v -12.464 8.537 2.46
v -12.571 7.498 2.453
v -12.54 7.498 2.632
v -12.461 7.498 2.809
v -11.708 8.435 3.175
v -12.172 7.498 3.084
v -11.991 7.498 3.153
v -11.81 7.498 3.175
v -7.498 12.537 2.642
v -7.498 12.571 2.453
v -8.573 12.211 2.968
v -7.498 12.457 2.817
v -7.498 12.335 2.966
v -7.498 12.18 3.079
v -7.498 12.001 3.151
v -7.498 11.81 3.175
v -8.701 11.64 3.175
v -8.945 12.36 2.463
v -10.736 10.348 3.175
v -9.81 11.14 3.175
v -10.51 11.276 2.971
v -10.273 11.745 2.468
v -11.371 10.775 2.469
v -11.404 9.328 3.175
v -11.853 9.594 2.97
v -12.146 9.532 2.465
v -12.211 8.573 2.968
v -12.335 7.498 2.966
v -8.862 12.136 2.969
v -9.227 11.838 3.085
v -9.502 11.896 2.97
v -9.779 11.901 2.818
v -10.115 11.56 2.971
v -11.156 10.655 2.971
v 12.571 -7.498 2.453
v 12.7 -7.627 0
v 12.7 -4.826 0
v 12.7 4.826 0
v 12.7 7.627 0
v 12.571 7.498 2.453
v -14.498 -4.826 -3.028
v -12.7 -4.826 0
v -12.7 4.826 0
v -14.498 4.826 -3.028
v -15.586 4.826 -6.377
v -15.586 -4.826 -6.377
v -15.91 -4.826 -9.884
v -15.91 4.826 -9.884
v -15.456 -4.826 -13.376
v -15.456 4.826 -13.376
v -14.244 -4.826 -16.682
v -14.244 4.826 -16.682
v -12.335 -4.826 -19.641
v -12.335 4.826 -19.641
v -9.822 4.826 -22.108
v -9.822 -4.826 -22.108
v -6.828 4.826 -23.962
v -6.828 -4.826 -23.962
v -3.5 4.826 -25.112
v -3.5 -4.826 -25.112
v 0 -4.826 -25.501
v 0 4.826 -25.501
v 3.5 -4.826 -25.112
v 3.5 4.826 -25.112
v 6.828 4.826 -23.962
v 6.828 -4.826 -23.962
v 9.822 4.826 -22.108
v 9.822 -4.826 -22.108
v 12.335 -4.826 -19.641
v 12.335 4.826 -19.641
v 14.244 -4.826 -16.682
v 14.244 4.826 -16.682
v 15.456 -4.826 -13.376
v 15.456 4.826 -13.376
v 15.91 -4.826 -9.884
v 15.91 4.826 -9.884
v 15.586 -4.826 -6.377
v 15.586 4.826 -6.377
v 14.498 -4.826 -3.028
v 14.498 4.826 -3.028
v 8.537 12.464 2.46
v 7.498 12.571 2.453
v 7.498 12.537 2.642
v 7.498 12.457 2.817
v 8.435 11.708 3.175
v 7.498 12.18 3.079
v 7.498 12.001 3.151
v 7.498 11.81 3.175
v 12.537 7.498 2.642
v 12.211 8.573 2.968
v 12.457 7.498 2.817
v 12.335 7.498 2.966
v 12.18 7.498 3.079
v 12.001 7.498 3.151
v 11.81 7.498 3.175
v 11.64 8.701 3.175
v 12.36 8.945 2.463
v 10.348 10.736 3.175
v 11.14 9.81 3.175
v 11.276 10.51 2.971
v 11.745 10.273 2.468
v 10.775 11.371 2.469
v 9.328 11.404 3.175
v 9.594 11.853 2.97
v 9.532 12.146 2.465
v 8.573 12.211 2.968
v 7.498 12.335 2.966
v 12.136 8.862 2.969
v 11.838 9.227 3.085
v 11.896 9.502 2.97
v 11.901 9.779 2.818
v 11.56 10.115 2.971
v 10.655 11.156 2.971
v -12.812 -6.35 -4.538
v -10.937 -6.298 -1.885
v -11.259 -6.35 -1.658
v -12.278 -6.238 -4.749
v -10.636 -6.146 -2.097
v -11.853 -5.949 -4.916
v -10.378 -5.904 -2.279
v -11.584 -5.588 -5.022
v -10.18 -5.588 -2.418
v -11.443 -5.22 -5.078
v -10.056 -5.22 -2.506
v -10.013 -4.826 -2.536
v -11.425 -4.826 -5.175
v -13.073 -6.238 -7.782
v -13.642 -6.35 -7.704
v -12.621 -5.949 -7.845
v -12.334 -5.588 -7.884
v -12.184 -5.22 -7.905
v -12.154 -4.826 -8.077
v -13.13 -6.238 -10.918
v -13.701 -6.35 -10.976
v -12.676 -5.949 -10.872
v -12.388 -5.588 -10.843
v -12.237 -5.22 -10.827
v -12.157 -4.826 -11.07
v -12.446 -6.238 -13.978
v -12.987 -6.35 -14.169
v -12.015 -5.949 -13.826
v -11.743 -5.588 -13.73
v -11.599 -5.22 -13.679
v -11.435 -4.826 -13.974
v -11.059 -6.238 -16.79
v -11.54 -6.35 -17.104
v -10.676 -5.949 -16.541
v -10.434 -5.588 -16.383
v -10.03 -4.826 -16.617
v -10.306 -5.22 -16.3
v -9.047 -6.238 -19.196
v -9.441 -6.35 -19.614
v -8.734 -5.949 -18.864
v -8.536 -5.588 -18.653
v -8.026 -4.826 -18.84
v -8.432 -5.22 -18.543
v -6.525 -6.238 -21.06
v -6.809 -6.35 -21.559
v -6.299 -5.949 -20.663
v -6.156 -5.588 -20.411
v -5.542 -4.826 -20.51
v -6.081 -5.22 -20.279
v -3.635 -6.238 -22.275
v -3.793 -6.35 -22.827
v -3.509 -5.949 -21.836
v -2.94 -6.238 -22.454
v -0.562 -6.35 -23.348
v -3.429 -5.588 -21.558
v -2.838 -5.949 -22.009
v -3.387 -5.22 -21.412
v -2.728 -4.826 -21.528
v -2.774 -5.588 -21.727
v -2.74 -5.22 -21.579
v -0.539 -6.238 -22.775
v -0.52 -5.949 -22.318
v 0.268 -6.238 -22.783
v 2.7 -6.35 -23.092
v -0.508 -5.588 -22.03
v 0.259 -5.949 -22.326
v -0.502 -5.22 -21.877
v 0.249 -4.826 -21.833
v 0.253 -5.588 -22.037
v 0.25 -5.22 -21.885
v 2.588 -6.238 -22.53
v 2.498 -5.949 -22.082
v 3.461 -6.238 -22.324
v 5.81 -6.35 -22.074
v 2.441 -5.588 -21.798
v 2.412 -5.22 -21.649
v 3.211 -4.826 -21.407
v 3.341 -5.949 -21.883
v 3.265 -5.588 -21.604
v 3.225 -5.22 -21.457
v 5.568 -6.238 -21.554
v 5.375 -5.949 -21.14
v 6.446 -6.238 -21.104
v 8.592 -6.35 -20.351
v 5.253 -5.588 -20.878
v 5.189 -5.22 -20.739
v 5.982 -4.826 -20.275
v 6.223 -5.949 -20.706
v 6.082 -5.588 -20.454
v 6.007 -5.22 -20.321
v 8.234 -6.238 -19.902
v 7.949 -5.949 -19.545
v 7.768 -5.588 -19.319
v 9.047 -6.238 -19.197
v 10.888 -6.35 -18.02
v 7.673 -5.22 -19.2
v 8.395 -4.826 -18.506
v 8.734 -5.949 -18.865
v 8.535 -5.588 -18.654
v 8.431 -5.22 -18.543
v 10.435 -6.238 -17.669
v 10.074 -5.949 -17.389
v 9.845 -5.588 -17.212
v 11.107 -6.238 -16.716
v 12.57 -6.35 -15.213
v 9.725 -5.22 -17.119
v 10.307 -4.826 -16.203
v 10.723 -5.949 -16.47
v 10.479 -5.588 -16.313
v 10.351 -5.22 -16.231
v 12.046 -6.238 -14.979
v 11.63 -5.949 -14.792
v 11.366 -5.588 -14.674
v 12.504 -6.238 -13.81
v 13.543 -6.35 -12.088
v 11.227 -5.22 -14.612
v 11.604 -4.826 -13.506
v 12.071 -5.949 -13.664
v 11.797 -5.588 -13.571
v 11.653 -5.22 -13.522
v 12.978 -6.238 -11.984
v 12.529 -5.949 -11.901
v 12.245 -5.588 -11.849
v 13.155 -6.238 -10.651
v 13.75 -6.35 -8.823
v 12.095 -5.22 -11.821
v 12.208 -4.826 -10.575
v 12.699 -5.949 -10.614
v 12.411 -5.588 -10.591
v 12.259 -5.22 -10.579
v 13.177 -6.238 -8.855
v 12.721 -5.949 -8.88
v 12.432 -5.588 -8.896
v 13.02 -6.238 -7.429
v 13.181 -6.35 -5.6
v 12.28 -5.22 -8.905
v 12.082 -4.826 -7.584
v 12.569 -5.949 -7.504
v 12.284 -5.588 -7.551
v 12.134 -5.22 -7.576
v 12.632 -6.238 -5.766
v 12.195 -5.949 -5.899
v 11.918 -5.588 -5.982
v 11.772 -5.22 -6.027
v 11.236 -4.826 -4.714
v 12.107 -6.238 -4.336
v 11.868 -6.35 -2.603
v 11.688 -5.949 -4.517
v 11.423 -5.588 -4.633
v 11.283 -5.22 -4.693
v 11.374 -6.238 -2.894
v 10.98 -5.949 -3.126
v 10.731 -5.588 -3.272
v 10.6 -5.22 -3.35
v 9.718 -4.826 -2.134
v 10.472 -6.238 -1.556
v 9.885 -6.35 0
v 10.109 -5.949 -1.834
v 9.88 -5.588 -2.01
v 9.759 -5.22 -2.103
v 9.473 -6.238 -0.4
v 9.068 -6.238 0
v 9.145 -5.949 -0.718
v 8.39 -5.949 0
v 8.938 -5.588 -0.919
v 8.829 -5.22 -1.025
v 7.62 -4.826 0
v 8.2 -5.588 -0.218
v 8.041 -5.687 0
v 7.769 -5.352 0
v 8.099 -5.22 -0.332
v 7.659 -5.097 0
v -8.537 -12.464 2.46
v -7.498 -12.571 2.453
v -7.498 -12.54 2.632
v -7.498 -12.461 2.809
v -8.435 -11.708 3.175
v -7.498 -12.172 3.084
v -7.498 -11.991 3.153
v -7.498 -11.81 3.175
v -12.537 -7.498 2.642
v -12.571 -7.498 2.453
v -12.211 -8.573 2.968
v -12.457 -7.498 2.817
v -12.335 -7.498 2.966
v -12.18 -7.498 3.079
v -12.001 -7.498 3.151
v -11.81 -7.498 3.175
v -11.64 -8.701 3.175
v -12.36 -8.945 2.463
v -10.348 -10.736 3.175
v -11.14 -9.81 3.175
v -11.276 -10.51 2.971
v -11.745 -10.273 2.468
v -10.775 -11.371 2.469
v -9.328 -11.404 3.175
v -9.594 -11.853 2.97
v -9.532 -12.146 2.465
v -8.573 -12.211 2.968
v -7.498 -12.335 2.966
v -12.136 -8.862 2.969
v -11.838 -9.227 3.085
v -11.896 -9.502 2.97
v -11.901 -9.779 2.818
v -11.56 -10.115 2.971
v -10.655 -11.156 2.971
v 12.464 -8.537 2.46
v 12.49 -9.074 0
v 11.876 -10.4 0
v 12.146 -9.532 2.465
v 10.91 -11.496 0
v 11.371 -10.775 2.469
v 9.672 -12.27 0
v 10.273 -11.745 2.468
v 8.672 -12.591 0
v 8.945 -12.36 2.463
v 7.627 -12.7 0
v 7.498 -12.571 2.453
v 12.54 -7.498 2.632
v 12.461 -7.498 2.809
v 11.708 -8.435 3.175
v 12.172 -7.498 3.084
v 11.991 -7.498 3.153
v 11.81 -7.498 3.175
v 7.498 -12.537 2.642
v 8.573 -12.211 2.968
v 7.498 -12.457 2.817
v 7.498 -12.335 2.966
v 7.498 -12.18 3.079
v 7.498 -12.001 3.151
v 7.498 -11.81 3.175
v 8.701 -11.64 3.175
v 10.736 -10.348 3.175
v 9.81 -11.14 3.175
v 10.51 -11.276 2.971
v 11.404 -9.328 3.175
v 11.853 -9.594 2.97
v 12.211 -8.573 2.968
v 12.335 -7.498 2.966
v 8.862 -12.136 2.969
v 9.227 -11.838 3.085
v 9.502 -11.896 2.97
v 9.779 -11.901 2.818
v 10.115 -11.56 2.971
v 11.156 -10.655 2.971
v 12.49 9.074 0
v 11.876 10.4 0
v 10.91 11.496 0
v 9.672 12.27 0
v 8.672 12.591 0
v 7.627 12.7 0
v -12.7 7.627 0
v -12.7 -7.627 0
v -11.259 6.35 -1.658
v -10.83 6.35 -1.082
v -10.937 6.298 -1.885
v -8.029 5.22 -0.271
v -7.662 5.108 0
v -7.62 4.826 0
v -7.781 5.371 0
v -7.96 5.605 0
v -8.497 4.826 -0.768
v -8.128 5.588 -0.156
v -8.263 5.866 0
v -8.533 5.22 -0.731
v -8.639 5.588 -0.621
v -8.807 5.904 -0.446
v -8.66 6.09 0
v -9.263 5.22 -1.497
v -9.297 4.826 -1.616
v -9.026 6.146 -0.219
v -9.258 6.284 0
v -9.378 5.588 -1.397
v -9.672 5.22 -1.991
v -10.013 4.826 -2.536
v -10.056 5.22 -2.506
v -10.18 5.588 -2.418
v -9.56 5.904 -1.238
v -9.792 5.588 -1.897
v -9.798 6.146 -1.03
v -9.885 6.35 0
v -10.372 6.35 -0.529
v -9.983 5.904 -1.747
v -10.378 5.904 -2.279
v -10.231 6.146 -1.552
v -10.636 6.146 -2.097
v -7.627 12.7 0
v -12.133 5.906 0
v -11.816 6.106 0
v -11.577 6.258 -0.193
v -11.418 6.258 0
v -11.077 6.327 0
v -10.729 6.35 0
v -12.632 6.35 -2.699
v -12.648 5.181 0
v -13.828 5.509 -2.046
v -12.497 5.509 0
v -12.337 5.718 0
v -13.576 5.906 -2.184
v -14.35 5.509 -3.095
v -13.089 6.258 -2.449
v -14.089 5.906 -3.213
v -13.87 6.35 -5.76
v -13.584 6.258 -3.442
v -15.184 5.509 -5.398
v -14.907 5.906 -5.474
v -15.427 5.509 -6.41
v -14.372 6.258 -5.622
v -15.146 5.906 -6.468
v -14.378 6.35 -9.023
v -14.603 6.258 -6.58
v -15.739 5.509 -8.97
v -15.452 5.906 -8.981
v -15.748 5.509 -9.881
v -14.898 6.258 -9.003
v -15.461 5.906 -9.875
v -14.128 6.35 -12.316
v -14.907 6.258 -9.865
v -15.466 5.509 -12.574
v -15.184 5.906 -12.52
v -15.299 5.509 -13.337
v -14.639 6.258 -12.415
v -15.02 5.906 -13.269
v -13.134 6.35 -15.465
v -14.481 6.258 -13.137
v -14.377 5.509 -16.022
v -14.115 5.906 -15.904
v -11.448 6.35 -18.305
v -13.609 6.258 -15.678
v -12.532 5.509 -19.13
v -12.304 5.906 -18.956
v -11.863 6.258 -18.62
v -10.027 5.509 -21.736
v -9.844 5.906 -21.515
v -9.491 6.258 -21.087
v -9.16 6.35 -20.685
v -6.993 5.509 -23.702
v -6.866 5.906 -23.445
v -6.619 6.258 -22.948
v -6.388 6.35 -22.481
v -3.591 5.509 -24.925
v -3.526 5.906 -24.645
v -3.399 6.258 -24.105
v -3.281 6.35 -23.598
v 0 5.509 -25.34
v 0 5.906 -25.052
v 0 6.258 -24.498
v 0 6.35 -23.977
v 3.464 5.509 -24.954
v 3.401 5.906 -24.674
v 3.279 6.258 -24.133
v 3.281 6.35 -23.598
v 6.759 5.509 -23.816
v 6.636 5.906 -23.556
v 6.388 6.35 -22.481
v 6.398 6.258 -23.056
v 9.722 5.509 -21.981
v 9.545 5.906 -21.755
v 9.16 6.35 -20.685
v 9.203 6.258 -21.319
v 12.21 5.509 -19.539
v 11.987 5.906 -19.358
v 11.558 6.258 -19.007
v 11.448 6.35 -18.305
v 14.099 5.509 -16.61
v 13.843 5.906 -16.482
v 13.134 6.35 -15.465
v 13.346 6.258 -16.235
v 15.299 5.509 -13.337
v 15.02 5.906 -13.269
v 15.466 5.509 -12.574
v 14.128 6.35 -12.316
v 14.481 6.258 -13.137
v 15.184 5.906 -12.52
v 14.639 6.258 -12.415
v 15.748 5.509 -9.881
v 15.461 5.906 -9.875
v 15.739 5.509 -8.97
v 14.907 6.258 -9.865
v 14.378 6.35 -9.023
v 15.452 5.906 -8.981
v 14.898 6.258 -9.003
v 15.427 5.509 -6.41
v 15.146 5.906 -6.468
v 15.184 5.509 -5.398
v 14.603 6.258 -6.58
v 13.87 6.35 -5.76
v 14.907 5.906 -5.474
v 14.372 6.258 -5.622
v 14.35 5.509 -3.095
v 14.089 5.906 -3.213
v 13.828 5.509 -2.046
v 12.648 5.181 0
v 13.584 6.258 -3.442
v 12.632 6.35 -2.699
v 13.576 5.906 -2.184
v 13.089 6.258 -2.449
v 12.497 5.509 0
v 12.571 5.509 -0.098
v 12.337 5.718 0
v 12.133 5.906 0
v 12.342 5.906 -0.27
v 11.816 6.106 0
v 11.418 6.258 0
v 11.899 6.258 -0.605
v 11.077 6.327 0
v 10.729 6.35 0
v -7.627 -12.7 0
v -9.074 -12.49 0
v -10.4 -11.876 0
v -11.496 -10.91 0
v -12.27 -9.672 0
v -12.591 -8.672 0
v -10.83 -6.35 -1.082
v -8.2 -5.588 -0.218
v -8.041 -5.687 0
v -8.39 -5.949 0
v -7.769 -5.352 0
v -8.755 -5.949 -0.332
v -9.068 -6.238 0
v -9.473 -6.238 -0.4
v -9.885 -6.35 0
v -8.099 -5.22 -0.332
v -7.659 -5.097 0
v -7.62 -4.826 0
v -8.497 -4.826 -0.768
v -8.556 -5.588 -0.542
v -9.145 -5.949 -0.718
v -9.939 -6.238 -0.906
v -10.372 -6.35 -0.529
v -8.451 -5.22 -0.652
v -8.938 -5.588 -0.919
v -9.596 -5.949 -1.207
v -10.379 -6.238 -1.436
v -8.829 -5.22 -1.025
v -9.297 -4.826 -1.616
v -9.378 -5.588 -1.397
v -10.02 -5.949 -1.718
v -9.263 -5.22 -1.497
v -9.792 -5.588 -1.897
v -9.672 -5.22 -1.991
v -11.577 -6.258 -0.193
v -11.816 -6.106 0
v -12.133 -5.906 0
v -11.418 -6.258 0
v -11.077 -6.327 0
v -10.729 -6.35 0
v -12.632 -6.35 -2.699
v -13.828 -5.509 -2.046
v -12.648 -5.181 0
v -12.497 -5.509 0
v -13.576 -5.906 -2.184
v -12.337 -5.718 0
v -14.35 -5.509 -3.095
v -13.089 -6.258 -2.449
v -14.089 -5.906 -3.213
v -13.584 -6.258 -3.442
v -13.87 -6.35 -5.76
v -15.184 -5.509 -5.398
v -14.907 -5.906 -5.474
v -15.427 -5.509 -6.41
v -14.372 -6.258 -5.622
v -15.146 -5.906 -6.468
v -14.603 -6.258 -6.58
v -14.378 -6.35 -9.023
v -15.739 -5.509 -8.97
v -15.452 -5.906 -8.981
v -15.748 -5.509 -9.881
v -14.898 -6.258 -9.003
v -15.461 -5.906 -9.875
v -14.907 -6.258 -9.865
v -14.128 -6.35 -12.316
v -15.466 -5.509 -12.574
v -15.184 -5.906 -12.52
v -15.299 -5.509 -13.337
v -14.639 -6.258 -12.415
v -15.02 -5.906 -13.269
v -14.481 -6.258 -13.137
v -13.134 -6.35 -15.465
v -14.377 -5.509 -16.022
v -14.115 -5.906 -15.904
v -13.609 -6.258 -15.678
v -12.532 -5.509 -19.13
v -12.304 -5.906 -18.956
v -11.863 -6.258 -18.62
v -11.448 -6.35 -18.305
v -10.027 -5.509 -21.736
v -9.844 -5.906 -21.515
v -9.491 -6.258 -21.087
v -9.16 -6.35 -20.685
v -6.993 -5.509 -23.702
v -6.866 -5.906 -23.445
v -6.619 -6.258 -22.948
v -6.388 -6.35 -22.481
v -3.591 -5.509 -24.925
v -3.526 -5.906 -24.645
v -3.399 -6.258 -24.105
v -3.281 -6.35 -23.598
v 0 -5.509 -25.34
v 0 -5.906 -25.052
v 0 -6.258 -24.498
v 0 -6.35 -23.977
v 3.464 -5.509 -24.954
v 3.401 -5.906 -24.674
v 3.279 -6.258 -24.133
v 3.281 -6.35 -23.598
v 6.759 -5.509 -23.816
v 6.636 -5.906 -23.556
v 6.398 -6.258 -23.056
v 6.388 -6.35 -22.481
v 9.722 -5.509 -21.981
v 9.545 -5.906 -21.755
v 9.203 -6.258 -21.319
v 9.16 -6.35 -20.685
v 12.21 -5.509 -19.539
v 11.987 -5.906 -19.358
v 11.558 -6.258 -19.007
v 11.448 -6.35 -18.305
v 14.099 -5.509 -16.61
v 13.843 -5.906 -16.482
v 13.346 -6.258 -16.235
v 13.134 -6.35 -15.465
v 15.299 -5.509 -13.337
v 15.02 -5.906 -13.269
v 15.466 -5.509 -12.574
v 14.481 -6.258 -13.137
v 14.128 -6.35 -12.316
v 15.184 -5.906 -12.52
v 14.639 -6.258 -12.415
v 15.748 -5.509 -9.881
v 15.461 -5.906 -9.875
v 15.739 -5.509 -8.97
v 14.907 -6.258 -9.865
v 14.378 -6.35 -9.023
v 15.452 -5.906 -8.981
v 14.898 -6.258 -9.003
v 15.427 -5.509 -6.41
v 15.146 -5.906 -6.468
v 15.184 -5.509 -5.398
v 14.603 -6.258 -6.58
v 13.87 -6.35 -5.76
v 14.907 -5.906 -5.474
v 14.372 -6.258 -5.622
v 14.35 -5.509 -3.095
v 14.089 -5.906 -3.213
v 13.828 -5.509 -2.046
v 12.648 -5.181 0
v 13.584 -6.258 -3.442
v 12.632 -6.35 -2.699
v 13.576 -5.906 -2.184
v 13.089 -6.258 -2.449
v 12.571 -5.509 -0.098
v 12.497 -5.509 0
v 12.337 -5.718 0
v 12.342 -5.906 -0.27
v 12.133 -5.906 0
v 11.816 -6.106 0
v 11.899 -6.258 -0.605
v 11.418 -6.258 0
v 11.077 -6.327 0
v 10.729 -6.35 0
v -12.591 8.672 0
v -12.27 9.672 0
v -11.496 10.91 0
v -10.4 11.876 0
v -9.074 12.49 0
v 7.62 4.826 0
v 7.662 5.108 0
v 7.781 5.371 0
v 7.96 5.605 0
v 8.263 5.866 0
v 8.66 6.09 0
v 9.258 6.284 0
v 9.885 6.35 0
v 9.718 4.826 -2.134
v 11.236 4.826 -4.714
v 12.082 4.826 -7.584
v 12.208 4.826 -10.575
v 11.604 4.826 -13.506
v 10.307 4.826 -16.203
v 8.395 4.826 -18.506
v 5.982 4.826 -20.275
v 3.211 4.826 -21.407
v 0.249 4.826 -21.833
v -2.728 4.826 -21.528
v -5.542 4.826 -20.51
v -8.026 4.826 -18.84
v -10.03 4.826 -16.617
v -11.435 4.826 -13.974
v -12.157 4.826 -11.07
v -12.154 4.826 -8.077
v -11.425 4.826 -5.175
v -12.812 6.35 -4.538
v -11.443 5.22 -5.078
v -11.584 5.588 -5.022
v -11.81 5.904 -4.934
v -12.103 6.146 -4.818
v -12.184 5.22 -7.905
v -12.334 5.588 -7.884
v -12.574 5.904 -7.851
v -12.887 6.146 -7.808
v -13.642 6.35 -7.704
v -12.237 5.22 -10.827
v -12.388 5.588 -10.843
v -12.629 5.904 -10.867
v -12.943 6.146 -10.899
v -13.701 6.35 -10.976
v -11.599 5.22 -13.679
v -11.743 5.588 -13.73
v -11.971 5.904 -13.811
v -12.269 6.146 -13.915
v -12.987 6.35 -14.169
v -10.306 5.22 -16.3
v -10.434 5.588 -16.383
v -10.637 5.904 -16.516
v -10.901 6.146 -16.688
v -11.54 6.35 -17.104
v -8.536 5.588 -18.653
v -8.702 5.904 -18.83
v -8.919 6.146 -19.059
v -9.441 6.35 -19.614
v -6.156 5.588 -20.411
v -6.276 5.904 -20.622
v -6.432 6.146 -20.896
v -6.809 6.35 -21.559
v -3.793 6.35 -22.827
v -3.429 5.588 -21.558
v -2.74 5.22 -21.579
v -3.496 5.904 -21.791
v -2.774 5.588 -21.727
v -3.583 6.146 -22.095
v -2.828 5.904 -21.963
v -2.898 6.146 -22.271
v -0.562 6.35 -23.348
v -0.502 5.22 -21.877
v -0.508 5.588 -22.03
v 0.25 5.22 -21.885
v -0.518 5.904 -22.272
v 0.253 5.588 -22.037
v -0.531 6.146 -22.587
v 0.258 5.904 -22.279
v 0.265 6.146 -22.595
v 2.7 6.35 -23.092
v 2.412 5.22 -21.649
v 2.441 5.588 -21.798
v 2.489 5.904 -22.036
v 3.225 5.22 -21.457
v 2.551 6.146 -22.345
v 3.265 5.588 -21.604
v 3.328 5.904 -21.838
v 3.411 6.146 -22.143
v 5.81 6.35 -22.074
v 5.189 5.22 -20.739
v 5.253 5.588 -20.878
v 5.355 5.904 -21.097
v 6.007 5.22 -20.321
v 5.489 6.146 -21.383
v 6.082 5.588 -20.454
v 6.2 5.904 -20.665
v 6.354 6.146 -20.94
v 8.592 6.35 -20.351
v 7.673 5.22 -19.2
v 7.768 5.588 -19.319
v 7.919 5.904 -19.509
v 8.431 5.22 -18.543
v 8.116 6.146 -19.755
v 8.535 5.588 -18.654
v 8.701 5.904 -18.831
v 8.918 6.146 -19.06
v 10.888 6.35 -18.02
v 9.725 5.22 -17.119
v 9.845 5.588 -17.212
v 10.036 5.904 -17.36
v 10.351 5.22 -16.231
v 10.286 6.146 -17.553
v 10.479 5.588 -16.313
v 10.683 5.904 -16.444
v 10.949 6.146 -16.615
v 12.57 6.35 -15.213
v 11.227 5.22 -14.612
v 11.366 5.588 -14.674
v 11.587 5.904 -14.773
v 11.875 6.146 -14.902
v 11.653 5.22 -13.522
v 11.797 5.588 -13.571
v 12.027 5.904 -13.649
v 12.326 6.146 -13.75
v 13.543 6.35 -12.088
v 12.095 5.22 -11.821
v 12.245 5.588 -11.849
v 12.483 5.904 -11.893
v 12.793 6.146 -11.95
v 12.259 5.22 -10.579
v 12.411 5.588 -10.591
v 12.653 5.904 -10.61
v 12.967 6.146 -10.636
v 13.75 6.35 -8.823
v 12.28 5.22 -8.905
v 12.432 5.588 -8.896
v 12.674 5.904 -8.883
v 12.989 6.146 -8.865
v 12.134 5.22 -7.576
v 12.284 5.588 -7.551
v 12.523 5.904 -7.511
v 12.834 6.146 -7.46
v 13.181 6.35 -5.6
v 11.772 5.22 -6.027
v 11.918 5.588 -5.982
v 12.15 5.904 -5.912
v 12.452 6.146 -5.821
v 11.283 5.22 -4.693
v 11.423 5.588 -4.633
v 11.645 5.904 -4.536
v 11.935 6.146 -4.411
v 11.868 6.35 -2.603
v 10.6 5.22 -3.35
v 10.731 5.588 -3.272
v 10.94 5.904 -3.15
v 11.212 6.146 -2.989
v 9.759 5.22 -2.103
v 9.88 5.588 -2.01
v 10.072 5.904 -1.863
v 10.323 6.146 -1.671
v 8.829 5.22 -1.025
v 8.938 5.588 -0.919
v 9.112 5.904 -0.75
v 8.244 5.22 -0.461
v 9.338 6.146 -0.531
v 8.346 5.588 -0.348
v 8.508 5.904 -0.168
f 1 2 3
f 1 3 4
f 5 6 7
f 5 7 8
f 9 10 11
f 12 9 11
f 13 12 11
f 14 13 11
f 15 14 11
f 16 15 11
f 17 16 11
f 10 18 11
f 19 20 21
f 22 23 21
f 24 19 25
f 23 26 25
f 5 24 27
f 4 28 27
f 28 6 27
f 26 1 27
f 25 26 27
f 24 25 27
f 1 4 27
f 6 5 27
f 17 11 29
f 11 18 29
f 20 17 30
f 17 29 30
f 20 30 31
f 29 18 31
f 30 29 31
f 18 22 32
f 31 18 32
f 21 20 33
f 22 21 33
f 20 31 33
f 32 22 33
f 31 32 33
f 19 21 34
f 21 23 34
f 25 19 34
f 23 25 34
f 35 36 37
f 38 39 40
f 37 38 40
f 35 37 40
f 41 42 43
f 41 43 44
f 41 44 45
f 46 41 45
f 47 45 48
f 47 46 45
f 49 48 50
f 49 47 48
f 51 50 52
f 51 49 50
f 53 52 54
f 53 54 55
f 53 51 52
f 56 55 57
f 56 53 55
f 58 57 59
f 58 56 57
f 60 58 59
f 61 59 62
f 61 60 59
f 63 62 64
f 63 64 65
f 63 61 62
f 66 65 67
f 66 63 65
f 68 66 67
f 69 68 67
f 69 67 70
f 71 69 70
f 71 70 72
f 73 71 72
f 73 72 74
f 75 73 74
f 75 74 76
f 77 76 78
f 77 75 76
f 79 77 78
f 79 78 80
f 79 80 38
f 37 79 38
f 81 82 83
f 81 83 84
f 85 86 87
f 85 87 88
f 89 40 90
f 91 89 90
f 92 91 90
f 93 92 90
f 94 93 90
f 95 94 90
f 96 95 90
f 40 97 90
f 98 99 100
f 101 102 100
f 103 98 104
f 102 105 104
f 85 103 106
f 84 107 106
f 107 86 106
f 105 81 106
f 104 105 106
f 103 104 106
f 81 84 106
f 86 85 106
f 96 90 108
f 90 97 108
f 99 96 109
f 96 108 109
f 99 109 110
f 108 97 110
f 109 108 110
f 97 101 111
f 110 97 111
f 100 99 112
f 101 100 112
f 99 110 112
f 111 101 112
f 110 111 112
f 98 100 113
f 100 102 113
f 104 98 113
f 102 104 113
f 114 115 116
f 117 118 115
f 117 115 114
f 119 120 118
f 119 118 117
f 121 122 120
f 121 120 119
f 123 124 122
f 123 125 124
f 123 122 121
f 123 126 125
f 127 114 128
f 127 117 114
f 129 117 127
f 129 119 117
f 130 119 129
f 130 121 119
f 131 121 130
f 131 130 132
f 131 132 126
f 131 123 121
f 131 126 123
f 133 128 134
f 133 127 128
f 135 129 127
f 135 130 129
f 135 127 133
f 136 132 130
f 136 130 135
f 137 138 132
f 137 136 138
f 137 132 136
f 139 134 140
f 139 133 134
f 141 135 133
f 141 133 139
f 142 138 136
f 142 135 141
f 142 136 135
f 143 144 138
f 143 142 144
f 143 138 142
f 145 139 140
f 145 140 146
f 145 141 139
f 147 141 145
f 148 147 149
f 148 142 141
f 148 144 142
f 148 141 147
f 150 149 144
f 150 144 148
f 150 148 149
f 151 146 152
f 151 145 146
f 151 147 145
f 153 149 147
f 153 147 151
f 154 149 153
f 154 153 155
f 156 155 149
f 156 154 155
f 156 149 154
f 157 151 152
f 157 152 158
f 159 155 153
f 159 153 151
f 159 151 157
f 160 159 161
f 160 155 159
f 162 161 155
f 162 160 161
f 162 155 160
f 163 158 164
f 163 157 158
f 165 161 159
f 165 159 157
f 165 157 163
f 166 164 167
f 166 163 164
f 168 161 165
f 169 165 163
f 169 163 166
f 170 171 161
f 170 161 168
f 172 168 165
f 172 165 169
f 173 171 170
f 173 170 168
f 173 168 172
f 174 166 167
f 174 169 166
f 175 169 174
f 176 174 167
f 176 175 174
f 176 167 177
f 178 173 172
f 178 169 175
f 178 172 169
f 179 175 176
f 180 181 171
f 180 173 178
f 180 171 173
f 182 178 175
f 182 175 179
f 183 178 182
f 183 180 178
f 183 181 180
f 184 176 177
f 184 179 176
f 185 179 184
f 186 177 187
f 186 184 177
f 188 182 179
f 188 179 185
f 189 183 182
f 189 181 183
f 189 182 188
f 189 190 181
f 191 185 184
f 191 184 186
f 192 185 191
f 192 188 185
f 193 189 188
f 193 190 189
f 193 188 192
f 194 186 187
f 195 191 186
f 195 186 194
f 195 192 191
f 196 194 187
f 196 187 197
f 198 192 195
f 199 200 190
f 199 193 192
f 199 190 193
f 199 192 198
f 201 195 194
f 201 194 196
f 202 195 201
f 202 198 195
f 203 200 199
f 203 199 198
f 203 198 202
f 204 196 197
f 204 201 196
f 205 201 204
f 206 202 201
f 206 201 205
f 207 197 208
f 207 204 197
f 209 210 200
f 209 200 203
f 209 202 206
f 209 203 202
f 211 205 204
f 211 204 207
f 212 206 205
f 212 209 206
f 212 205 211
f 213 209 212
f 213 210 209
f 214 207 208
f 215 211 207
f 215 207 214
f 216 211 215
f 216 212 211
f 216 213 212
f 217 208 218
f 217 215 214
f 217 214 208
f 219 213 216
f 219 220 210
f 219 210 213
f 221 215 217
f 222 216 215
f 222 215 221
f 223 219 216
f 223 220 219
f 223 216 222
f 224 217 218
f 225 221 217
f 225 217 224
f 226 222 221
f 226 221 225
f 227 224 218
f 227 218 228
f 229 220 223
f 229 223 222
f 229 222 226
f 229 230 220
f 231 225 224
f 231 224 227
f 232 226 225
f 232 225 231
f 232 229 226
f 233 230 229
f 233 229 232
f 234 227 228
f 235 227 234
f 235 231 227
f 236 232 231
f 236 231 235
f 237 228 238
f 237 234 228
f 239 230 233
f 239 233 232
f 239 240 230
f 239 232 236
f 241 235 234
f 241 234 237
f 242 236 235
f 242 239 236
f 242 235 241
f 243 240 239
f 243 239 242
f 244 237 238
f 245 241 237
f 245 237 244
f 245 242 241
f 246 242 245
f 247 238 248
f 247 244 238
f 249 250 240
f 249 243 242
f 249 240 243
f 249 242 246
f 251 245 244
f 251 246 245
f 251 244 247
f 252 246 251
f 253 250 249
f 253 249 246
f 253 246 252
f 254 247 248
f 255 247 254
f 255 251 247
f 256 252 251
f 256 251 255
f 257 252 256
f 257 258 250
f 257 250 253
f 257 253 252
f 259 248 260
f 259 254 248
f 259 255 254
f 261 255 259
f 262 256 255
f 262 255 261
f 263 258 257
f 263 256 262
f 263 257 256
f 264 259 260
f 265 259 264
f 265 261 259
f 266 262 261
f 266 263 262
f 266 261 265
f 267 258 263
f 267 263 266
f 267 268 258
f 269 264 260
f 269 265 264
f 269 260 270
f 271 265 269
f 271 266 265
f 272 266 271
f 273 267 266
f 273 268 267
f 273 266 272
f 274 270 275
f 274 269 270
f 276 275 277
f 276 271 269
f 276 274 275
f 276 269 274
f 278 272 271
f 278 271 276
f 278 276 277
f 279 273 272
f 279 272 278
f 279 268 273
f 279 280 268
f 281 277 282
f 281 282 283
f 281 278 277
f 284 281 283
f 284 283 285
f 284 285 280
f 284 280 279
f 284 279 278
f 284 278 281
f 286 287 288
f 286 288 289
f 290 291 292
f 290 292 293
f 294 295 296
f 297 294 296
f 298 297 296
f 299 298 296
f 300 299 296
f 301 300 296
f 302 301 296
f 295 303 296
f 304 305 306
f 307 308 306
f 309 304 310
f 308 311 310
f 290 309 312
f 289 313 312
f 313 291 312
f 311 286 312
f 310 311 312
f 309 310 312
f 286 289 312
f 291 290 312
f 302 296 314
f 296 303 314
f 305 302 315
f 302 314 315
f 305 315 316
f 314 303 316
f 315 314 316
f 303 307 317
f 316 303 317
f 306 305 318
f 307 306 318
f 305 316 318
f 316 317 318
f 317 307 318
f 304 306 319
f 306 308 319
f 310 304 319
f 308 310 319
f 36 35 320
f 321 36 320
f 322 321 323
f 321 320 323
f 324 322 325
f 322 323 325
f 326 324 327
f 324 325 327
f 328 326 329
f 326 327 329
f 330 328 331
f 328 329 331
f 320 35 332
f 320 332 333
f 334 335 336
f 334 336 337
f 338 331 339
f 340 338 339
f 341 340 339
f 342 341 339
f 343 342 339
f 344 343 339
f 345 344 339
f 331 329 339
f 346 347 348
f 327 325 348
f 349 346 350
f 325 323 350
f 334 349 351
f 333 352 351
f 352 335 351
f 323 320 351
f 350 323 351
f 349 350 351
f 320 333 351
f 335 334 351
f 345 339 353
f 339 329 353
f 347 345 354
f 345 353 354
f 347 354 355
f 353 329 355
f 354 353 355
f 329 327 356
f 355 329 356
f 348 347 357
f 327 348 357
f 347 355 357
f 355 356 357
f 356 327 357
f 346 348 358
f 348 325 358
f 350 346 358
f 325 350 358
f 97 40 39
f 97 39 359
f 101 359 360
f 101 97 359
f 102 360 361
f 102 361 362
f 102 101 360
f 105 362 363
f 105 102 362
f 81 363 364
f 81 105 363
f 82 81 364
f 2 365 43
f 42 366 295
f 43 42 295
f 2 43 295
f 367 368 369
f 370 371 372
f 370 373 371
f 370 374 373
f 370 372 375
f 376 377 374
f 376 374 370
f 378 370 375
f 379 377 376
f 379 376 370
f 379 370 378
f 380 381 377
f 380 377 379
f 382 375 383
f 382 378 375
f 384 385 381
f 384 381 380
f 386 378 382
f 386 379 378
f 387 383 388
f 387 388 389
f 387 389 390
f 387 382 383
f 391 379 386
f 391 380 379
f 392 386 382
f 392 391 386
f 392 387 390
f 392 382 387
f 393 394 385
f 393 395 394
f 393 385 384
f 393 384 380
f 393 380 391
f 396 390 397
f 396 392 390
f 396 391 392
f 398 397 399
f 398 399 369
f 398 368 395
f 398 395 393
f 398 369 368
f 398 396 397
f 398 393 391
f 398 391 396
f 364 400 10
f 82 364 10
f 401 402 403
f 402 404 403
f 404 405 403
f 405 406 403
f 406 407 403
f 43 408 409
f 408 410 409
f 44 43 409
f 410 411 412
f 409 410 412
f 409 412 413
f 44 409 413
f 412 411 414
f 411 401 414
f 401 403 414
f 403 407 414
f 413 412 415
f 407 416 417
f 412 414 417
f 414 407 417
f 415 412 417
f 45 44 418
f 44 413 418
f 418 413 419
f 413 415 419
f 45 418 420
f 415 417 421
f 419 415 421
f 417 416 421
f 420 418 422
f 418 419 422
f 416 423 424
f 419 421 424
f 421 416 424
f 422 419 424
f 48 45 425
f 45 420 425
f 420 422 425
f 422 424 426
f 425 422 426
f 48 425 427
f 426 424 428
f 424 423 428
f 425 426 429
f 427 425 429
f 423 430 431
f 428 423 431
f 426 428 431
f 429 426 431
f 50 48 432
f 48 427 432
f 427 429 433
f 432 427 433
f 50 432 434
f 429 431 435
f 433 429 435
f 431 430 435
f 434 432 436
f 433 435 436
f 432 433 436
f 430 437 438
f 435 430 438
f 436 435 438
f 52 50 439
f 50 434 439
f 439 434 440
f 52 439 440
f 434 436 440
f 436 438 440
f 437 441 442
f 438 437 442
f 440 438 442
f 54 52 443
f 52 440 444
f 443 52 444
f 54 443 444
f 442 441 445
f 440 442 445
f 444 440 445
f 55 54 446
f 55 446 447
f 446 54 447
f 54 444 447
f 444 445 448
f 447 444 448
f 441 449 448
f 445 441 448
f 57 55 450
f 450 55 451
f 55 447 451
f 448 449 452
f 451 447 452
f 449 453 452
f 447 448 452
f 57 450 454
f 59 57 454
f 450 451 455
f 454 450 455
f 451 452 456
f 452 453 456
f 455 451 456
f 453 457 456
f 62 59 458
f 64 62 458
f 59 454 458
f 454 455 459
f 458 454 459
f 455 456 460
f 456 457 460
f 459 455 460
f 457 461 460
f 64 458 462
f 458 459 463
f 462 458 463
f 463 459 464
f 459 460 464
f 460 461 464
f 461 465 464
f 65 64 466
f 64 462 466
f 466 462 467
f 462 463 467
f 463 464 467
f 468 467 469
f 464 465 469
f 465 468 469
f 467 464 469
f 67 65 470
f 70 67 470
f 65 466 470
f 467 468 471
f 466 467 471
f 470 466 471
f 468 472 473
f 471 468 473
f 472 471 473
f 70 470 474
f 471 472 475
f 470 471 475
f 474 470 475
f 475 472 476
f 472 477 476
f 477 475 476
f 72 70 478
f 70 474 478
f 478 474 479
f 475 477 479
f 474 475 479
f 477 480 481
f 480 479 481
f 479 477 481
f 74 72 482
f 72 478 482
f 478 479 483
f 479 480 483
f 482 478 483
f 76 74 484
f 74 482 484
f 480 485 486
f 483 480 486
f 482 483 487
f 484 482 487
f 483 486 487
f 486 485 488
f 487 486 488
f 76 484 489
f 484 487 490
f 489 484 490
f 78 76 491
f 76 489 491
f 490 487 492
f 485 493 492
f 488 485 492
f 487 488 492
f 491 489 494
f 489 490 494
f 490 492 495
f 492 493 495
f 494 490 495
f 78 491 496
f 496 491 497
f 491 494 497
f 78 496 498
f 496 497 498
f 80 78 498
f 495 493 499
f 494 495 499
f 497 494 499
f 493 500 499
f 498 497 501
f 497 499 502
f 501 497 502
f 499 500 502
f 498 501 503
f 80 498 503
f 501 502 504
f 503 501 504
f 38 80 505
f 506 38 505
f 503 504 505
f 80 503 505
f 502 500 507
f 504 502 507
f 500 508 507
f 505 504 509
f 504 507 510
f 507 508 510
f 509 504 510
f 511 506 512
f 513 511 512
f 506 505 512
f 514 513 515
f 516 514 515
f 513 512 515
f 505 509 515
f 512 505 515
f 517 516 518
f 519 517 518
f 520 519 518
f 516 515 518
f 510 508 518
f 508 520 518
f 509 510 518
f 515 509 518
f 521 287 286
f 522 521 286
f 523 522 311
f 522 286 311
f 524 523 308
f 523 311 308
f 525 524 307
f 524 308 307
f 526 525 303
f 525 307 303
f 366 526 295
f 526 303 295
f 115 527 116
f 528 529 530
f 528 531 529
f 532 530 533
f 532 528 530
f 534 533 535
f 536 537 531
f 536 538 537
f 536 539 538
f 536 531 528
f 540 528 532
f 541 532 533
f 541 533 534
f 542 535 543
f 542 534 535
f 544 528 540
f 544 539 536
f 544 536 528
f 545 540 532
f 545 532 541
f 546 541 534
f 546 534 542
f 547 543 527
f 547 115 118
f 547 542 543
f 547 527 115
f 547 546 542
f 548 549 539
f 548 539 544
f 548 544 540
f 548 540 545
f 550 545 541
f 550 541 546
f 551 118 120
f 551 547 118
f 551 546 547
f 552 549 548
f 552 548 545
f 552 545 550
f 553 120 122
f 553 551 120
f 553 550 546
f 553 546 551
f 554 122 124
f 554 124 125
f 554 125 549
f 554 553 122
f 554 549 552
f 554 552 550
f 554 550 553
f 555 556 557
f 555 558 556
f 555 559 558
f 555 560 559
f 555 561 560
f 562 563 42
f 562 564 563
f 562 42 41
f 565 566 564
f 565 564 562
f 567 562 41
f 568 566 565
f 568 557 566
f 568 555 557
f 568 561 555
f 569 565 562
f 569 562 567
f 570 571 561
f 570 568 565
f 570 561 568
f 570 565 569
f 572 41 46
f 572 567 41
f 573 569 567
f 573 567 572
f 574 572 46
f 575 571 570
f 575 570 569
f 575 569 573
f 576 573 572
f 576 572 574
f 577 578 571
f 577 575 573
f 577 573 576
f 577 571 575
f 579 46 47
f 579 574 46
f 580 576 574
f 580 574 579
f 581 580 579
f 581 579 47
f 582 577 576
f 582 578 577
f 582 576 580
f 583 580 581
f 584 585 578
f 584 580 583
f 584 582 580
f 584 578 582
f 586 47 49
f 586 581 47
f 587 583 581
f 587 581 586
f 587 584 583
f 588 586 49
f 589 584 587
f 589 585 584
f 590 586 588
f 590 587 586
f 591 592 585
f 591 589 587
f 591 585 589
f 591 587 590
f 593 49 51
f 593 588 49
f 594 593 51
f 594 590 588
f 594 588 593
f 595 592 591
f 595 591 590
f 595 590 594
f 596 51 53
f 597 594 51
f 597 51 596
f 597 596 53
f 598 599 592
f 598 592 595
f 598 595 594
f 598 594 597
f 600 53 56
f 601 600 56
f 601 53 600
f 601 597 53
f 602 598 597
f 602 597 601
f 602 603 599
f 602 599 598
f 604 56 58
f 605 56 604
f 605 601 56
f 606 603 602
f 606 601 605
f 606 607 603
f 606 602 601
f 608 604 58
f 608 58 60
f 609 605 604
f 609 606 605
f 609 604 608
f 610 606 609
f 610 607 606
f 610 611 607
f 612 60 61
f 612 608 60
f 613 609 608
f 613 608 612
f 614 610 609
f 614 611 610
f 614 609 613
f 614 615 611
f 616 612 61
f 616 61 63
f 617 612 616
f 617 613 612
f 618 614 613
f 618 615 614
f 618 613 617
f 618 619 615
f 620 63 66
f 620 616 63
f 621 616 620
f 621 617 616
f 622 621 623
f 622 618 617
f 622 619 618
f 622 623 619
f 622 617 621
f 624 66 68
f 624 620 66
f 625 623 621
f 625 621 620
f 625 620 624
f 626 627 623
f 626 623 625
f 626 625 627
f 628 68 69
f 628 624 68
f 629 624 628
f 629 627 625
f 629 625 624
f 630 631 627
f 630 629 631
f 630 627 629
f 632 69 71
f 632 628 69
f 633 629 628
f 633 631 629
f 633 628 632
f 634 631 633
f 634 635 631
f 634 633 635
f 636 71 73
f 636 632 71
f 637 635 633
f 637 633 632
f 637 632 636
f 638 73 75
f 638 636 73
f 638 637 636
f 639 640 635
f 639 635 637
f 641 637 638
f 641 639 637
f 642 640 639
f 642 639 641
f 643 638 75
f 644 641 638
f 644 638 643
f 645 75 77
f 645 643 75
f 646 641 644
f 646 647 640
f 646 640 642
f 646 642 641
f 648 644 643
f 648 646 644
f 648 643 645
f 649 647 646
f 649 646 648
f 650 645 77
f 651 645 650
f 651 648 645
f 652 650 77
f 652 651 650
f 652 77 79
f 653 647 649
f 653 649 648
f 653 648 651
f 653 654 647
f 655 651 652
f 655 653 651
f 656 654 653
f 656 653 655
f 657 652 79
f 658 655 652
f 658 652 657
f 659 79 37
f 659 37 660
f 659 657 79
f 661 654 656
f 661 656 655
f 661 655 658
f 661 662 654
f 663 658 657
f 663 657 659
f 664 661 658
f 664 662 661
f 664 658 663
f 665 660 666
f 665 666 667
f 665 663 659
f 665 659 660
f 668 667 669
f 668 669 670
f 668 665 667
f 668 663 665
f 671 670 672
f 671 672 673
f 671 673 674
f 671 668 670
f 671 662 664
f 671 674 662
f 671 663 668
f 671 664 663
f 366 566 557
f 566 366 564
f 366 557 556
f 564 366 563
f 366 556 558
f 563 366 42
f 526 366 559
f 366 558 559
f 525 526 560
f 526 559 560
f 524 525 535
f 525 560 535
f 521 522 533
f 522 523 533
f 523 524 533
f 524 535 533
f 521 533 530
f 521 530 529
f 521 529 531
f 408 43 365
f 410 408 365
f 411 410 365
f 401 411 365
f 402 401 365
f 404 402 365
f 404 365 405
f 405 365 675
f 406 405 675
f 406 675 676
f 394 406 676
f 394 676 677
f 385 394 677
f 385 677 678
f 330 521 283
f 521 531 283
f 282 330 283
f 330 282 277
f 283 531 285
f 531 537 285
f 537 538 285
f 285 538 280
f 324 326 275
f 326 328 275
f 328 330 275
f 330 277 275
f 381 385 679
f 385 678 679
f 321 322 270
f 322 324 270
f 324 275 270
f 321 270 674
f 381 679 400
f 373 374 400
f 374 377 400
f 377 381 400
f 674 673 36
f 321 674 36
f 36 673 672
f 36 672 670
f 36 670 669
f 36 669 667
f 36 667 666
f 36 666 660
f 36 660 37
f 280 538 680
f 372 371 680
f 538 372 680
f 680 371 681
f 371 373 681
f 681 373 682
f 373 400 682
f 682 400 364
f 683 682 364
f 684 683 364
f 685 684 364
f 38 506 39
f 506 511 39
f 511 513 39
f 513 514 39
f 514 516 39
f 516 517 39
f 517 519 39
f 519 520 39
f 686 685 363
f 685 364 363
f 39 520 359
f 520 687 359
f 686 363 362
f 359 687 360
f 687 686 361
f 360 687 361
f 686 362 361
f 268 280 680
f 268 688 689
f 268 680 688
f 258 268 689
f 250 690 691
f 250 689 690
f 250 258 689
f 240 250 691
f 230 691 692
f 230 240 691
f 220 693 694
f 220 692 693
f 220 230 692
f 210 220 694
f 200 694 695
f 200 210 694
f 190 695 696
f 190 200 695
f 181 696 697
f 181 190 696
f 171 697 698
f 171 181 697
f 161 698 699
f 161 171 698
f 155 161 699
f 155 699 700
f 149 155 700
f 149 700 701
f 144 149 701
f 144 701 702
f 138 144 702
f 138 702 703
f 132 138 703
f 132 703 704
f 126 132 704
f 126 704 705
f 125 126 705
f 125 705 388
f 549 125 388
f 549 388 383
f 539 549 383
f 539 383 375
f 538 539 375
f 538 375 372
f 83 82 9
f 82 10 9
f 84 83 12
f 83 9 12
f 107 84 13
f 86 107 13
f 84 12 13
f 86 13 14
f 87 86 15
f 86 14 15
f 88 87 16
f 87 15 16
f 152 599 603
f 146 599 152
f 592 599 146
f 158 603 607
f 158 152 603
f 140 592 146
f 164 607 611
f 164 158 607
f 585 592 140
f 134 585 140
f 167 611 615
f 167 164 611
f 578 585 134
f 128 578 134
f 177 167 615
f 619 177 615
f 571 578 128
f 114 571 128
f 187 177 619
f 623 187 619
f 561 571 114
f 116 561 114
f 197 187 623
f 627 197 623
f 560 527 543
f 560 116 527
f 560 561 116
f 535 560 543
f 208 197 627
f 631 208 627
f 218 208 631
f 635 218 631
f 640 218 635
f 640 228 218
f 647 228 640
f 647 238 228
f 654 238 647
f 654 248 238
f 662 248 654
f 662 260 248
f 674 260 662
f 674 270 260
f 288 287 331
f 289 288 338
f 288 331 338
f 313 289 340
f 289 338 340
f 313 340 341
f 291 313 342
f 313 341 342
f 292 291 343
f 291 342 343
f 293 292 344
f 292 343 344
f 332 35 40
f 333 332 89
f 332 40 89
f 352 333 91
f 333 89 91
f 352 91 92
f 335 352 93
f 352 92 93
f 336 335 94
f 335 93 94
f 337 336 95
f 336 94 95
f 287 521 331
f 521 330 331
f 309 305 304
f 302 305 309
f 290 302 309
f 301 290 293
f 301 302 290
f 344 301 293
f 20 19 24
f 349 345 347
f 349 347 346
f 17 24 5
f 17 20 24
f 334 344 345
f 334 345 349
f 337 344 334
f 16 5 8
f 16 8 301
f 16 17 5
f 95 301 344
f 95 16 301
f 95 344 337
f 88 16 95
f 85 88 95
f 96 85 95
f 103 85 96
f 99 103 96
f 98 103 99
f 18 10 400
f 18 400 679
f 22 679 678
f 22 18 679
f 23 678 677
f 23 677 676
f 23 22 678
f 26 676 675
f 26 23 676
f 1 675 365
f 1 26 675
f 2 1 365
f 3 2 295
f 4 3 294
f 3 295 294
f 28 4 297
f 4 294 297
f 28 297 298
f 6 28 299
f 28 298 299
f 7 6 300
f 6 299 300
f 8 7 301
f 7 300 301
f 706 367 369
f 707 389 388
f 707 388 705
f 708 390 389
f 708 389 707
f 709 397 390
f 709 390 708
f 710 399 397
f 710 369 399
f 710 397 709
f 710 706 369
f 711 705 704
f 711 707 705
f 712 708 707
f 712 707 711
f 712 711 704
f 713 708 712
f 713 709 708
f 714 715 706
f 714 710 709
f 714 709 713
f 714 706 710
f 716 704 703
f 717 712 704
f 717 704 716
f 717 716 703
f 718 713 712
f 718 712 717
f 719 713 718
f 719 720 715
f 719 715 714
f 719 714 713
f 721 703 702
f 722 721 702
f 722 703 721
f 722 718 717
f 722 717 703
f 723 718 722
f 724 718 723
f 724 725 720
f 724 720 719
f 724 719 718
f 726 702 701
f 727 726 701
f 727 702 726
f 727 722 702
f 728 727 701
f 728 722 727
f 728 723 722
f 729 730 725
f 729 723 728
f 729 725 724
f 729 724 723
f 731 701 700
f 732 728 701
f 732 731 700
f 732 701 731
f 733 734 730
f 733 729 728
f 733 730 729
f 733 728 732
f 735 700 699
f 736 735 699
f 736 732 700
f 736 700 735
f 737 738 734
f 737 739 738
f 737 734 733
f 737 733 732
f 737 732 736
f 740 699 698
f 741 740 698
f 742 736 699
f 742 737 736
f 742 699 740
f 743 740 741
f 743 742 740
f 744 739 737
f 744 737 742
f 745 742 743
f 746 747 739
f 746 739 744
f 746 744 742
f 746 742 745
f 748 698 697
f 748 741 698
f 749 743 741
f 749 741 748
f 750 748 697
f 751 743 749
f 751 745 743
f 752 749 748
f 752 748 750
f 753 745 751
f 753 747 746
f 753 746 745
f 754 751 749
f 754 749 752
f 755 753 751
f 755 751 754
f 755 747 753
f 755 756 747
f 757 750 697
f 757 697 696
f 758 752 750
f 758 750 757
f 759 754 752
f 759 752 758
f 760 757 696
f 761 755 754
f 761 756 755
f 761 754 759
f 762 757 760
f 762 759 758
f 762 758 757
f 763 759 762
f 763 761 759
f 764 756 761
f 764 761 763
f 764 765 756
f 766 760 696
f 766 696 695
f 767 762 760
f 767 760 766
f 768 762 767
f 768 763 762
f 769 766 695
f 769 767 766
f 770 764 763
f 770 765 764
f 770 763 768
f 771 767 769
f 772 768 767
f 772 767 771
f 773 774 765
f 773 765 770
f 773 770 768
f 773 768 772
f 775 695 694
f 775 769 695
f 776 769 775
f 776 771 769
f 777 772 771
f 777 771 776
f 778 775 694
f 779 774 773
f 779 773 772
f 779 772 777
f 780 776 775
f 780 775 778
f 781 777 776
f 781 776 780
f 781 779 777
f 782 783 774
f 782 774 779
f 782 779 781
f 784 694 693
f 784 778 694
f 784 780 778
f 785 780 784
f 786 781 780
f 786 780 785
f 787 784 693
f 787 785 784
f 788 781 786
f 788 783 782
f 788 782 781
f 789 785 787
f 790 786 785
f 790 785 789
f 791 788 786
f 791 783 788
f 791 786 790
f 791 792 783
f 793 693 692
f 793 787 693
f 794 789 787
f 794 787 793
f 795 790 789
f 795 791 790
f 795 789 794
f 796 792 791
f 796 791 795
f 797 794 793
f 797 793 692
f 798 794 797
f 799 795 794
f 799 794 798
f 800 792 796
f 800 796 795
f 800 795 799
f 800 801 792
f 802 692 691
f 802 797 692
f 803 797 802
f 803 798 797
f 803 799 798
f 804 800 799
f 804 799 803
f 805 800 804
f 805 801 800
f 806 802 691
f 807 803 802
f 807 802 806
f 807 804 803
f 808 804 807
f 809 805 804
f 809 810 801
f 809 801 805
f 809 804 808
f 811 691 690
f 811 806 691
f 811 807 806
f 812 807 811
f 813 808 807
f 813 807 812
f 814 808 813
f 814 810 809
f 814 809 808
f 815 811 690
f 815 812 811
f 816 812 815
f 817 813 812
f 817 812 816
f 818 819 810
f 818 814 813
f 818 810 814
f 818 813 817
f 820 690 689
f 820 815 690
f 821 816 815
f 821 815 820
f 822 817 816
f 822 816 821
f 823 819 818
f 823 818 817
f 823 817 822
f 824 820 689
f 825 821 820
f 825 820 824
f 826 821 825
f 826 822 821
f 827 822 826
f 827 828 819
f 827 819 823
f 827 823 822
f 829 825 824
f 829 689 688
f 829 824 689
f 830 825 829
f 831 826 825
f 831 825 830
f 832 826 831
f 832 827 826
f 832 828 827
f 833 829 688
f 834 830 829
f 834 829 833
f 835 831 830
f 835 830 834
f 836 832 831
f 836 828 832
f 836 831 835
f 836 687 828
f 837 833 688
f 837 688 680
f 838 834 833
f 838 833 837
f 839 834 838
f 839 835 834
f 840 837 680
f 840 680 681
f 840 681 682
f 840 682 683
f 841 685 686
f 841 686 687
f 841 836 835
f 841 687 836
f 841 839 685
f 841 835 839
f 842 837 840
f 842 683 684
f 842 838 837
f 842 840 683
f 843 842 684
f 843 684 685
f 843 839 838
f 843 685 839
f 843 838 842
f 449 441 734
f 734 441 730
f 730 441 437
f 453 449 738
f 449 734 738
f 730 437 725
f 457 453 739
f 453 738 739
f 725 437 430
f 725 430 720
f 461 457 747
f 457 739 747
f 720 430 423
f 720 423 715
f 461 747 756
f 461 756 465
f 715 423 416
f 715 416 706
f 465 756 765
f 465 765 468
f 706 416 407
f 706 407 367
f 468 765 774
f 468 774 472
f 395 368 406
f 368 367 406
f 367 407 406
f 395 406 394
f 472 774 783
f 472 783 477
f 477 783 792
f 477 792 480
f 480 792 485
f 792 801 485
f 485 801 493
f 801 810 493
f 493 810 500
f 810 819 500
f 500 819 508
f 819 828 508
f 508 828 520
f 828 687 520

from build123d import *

# Parameters (mm, degrees)
F0_W          = 25.4
F0_H          = 25.4
F1_DEPTH      = 3.175
F1_TAPER      = 3
F3_W          = 5.08
F3_H          = 12.7
F6_DEPTH      = 6.35
F6_DEPTH_BACK = 6.35
F7_R          = 5.08
F8_R          = 1.524
F9_R          = 0.762


with BuildPart() as f1:
    # F0 (on Top) → F1 (new body)
    with BuildSketch(Plane.XY):
        Rectangle(F0_W, F0_H)
    extrude(amount=F1_DEPTH, taper=F1_TAPER)

    # F4: sweep along a path in F2
    with BuildLine(Plane.XZ) as f4_path:
        ThreePointArc((-10.16, 0), (0, -23.5582897328), (10.16, 0))
    # F3 (on face) → F4 (sweep)
    with BuildSketch(Plane(origin=(0, 0, 0), x_dir=(1, 0, 0), z_dir=(0, 0, -1))):
        with Locations((10.16, 0)):
            Rectangle(F3_W, F3_H)
    sweep(path=f4_path.line)

    # F5 (on Front) → F6 (join, two sides)
    with BuildSketch(Plane.XZ) as f6_sk:
        with BuildLine():
            Line((-7.62, 0), (-10.16, 0))
            Line((-10.16, 0), (-10.0130578512, -2.535746045))
            ThreePointArc((-10.0130578512, -2.535746045), (-8.9072265211, -1.1822790439), (-7.62, 0))
        make_face()
    extrude(amount=F6_DEPTH)
    extrude(f6_sk.sketch, amount=-F6_DEPTH_BACK)

    # F7
    f7_edges = [f1.edges().sort_by_distance(p)[0] for p in [
        (12.616803, 12.616803, 1.5875),
        (-12.616803, 12.616803, 1.5875),
        (12.616803, -12.616803, 1.5875),
        (-12.616803, -12.616803, 1.5875),
    ]]
    fillet(f7_edges, radius=F7_R)

    # F8
    f8_edges = [f1.edges().sort_by_distance(p)[0] for p in [
        (0, -6.35, -21.835726),
        (0, 6.35, -21.835726),
        (0, 6.35, -25.501344),
        (0, -6.35, -25.501344),
    ]]
    fillet(f8_edges, radius=F8_R)

    # F9
    f9_edges = [f1.edges().sort_by_distance(p)[0] for p in [
        (0, 12.533605, 3.175),
        (11.048589, 11.048589, 3.175),
        (-11.048589, 11.048589, 3.175),
        (12.533605, 0, 3.175),
        (-12.533605, 0, 3.175),
        (11.048589, -11.048589, 3.175),
        (-11.048589, -11.048589, 3.175),
        (0, -12.533605, 3.175),
    ]]
    fillet(f9_edges, radius=F9_R)


solid = f1.part
